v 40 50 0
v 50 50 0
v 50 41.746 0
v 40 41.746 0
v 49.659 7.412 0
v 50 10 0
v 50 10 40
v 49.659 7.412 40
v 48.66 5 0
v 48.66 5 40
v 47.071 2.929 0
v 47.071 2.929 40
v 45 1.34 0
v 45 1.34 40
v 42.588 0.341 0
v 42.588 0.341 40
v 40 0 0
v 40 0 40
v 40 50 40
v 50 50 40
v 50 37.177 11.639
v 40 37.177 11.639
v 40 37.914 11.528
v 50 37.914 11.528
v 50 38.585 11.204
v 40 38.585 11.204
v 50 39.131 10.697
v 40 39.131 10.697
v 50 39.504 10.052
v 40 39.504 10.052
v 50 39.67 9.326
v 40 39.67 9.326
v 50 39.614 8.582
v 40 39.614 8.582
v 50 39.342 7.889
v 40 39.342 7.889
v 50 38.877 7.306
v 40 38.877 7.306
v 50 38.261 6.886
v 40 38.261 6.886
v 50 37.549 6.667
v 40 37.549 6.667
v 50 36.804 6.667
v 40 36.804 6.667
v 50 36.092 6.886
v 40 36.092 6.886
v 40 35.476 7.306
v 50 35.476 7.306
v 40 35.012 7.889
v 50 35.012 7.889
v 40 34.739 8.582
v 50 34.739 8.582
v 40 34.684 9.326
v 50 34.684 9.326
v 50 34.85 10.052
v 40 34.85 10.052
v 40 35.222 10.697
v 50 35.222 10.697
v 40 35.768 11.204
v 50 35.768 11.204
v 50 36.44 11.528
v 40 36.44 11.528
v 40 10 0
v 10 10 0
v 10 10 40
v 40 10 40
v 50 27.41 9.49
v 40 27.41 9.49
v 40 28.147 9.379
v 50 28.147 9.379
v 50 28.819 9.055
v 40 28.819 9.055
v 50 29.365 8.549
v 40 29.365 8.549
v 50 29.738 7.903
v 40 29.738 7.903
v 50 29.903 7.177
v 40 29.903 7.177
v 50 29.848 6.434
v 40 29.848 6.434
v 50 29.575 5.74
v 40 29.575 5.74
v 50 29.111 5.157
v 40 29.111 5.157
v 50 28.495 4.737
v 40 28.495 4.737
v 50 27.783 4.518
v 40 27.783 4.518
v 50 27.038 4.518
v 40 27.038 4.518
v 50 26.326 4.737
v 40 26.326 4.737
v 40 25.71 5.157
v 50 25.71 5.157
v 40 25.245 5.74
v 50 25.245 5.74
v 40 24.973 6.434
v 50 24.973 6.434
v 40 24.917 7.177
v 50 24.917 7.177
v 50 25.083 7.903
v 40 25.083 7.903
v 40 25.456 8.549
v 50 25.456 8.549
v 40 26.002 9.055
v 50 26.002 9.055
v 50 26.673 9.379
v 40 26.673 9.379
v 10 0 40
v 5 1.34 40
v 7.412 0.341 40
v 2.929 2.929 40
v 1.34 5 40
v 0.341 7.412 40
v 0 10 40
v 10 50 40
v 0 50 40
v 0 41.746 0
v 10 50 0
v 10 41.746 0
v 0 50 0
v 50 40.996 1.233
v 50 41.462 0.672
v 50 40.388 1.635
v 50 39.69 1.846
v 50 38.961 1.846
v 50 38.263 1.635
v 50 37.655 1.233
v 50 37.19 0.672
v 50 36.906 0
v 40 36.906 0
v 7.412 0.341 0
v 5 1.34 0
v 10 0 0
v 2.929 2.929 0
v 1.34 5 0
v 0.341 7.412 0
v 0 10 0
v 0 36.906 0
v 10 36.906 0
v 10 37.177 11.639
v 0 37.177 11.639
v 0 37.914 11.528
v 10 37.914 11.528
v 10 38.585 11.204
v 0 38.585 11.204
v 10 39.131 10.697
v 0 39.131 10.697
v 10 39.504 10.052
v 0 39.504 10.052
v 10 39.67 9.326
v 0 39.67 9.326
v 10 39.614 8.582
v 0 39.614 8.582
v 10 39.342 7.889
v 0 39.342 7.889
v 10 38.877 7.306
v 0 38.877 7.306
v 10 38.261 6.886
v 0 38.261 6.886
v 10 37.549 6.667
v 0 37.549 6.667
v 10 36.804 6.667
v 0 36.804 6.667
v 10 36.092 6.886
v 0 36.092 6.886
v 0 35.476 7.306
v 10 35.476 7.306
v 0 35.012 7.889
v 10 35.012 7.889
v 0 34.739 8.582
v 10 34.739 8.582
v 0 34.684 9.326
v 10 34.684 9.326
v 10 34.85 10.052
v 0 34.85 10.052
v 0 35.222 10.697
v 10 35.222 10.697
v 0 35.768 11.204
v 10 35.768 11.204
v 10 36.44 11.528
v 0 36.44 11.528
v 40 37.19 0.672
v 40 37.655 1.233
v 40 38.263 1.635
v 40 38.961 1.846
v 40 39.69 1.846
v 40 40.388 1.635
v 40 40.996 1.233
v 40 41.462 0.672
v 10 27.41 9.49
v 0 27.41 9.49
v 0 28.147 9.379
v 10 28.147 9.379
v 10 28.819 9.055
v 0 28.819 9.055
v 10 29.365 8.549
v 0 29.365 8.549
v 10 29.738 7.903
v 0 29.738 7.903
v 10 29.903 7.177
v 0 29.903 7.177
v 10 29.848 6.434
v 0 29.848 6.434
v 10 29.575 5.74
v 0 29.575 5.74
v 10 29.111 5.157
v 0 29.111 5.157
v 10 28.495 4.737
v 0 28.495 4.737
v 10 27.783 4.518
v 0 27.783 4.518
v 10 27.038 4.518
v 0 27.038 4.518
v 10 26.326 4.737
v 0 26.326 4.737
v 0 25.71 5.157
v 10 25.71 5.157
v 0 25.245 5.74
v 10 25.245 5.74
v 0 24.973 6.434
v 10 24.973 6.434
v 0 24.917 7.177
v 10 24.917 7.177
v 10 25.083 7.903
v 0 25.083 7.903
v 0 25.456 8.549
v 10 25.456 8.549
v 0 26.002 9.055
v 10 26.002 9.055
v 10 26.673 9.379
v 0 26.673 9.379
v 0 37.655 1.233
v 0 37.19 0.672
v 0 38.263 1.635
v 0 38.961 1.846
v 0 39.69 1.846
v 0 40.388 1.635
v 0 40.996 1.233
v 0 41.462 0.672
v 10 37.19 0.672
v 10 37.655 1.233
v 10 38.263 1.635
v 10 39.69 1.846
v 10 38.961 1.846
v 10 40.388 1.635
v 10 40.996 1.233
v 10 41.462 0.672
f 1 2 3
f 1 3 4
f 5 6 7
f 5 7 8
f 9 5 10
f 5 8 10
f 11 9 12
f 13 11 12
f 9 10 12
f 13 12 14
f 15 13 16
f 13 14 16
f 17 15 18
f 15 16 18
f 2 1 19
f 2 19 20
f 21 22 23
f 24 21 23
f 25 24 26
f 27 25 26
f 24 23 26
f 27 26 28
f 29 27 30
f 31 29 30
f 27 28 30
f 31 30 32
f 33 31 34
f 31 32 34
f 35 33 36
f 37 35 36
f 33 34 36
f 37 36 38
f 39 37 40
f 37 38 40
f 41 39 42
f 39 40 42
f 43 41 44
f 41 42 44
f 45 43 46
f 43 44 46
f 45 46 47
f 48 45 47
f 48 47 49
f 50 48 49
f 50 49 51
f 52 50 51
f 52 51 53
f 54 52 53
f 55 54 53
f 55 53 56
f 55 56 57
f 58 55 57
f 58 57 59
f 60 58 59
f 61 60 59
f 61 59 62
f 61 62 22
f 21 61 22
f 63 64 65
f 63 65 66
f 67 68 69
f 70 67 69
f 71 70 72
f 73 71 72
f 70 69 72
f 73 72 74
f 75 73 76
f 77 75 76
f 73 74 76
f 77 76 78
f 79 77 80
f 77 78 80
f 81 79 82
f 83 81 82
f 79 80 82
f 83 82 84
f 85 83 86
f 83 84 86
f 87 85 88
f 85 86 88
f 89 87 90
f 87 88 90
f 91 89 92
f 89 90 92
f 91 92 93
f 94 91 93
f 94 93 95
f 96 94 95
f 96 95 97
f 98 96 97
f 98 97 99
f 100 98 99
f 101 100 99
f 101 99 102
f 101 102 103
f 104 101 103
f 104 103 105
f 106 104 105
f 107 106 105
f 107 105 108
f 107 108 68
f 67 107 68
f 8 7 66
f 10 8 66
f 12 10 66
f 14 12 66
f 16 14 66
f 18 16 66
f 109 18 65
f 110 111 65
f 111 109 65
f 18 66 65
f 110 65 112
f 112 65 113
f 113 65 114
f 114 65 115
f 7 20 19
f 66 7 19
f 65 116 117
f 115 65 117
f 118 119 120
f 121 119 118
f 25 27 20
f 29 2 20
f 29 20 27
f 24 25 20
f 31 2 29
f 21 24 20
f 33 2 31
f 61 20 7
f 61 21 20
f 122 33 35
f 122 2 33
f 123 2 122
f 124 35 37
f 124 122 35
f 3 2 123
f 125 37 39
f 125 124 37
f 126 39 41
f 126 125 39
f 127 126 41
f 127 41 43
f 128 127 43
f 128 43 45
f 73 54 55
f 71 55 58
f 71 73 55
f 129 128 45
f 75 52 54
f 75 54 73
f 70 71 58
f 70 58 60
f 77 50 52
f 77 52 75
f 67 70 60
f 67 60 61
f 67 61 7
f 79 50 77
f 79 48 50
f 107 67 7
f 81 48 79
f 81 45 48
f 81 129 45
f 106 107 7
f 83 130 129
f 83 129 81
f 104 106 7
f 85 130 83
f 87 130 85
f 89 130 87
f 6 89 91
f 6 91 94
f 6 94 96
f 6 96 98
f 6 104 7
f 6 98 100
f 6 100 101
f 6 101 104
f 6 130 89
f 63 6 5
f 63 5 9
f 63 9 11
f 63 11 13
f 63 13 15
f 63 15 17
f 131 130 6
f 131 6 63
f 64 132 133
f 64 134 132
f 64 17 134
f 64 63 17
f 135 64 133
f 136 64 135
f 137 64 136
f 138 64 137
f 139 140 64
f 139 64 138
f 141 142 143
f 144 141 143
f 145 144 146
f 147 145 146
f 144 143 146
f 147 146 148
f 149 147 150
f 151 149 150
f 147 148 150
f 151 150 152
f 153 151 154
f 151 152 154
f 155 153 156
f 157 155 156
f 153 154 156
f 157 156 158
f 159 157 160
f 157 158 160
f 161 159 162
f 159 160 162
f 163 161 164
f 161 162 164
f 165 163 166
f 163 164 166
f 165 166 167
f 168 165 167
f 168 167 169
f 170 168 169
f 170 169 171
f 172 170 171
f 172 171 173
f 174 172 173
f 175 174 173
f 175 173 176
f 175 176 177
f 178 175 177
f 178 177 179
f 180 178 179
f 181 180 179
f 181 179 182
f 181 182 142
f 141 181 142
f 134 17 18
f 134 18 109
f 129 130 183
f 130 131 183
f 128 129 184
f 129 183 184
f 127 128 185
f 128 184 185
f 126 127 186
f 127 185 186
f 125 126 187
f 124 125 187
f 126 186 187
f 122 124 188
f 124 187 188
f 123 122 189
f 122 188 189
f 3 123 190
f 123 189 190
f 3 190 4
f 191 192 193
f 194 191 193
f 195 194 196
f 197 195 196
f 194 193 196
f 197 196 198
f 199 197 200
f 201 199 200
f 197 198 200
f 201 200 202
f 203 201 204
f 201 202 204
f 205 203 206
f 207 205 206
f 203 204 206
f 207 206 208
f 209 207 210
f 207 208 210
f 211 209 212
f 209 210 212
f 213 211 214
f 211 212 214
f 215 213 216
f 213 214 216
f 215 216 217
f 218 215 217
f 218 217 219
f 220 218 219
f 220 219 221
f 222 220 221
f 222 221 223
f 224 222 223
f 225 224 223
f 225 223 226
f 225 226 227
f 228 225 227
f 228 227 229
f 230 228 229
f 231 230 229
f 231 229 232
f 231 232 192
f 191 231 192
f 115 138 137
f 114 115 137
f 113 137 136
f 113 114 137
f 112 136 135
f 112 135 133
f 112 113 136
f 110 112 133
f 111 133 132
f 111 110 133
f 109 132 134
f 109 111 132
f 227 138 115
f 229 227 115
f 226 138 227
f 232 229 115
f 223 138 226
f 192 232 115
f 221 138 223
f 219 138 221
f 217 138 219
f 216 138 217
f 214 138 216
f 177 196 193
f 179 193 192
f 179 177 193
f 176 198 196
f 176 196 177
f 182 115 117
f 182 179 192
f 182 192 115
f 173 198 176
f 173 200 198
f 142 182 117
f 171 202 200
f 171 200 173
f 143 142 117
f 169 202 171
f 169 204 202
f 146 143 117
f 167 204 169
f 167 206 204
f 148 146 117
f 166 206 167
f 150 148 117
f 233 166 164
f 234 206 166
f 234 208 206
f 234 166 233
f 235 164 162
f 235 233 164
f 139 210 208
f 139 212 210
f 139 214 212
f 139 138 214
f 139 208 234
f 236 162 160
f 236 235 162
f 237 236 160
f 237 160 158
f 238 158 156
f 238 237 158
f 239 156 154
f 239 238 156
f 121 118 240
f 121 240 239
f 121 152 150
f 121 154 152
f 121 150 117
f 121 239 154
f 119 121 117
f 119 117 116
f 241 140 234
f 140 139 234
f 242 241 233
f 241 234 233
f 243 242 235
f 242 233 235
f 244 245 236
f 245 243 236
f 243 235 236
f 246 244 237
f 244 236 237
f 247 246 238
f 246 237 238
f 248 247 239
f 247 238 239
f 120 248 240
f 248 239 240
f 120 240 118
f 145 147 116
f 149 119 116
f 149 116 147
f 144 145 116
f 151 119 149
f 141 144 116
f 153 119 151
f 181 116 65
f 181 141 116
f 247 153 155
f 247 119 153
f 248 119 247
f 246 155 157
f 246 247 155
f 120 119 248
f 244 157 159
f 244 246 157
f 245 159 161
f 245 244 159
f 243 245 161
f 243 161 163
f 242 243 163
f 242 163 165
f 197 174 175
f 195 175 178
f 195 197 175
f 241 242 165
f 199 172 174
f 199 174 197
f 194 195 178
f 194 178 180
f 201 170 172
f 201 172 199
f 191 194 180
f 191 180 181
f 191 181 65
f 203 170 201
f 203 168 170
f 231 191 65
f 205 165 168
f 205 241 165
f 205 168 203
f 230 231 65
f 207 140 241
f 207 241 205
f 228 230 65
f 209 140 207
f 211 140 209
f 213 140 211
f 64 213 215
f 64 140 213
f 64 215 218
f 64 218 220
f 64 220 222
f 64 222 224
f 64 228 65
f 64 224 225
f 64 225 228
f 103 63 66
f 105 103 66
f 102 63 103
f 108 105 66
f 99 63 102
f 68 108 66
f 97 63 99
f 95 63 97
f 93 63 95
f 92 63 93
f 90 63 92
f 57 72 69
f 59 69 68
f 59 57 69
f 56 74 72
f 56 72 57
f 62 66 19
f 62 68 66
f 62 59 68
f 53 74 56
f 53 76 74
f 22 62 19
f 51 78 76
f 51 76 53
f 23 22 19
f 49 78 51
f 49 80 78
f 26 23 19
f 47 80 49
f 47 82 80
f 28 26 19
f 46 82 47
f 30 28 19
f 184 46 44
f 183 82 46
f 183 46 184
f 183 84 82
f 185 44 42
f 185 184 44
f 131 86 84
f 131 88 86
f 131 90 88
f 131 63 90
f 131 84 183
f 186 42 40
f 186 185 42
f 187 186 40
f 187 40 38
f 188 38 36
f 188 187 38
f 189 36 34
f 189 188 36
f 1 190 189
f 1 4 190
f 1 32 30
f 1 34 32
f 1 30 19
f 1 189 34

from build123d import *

# Parameters (mm, degrees)
RESSALTO_EXTRUS_O1_DEPTH = 40
FILETE1_R                = 10
ESBO_O3_R                = 2.5
CORTE_EXTRUS_O1_DEPTH    = 60


with BuildPart() as part:
    # Esboço1 → Ressalto-extrusão1 (new body)
    with BuildSketch(Plane.XY):
        Polygon((0, 0), (0, 50), (10, 50), (10, 10), (40, 10), (40, 50), (50, 50), (50, 0), align=None)
    extrude(amount=RESSALTO_EXTRUS_O1_DEPTH)

    # Filete1
    filete1_edges = [part.edges().sort_by_distance(p)[0] for p in [
        (0, 0, 20),
        (50, 0, 20),
    ]]
    fillet(filete1_edges, radius=FILETE1_R)

    # Esboço3 → Corte-extrusão1 (cut)
    with BuildSketch(Plane.ZY):
        with Locations((-0.627602125, 39.325673362)):
            Circle(ESBO_O3_R)
        with Locations((9.138766469, 37.17670978)):
            Circle(ESBO_O3_R)
        with Locations((6.989802887, 27.410341185)):
            Circle(ESBO_O3_R)
        with Locations((-2.776565708, 29.559304768)):
            Circle(ESBO_O3_R)
    extrude(amount=-CORTE_EXTRUS_O1_DEPTH, mode=Mode.SUBTRACT)


solid = part.part
